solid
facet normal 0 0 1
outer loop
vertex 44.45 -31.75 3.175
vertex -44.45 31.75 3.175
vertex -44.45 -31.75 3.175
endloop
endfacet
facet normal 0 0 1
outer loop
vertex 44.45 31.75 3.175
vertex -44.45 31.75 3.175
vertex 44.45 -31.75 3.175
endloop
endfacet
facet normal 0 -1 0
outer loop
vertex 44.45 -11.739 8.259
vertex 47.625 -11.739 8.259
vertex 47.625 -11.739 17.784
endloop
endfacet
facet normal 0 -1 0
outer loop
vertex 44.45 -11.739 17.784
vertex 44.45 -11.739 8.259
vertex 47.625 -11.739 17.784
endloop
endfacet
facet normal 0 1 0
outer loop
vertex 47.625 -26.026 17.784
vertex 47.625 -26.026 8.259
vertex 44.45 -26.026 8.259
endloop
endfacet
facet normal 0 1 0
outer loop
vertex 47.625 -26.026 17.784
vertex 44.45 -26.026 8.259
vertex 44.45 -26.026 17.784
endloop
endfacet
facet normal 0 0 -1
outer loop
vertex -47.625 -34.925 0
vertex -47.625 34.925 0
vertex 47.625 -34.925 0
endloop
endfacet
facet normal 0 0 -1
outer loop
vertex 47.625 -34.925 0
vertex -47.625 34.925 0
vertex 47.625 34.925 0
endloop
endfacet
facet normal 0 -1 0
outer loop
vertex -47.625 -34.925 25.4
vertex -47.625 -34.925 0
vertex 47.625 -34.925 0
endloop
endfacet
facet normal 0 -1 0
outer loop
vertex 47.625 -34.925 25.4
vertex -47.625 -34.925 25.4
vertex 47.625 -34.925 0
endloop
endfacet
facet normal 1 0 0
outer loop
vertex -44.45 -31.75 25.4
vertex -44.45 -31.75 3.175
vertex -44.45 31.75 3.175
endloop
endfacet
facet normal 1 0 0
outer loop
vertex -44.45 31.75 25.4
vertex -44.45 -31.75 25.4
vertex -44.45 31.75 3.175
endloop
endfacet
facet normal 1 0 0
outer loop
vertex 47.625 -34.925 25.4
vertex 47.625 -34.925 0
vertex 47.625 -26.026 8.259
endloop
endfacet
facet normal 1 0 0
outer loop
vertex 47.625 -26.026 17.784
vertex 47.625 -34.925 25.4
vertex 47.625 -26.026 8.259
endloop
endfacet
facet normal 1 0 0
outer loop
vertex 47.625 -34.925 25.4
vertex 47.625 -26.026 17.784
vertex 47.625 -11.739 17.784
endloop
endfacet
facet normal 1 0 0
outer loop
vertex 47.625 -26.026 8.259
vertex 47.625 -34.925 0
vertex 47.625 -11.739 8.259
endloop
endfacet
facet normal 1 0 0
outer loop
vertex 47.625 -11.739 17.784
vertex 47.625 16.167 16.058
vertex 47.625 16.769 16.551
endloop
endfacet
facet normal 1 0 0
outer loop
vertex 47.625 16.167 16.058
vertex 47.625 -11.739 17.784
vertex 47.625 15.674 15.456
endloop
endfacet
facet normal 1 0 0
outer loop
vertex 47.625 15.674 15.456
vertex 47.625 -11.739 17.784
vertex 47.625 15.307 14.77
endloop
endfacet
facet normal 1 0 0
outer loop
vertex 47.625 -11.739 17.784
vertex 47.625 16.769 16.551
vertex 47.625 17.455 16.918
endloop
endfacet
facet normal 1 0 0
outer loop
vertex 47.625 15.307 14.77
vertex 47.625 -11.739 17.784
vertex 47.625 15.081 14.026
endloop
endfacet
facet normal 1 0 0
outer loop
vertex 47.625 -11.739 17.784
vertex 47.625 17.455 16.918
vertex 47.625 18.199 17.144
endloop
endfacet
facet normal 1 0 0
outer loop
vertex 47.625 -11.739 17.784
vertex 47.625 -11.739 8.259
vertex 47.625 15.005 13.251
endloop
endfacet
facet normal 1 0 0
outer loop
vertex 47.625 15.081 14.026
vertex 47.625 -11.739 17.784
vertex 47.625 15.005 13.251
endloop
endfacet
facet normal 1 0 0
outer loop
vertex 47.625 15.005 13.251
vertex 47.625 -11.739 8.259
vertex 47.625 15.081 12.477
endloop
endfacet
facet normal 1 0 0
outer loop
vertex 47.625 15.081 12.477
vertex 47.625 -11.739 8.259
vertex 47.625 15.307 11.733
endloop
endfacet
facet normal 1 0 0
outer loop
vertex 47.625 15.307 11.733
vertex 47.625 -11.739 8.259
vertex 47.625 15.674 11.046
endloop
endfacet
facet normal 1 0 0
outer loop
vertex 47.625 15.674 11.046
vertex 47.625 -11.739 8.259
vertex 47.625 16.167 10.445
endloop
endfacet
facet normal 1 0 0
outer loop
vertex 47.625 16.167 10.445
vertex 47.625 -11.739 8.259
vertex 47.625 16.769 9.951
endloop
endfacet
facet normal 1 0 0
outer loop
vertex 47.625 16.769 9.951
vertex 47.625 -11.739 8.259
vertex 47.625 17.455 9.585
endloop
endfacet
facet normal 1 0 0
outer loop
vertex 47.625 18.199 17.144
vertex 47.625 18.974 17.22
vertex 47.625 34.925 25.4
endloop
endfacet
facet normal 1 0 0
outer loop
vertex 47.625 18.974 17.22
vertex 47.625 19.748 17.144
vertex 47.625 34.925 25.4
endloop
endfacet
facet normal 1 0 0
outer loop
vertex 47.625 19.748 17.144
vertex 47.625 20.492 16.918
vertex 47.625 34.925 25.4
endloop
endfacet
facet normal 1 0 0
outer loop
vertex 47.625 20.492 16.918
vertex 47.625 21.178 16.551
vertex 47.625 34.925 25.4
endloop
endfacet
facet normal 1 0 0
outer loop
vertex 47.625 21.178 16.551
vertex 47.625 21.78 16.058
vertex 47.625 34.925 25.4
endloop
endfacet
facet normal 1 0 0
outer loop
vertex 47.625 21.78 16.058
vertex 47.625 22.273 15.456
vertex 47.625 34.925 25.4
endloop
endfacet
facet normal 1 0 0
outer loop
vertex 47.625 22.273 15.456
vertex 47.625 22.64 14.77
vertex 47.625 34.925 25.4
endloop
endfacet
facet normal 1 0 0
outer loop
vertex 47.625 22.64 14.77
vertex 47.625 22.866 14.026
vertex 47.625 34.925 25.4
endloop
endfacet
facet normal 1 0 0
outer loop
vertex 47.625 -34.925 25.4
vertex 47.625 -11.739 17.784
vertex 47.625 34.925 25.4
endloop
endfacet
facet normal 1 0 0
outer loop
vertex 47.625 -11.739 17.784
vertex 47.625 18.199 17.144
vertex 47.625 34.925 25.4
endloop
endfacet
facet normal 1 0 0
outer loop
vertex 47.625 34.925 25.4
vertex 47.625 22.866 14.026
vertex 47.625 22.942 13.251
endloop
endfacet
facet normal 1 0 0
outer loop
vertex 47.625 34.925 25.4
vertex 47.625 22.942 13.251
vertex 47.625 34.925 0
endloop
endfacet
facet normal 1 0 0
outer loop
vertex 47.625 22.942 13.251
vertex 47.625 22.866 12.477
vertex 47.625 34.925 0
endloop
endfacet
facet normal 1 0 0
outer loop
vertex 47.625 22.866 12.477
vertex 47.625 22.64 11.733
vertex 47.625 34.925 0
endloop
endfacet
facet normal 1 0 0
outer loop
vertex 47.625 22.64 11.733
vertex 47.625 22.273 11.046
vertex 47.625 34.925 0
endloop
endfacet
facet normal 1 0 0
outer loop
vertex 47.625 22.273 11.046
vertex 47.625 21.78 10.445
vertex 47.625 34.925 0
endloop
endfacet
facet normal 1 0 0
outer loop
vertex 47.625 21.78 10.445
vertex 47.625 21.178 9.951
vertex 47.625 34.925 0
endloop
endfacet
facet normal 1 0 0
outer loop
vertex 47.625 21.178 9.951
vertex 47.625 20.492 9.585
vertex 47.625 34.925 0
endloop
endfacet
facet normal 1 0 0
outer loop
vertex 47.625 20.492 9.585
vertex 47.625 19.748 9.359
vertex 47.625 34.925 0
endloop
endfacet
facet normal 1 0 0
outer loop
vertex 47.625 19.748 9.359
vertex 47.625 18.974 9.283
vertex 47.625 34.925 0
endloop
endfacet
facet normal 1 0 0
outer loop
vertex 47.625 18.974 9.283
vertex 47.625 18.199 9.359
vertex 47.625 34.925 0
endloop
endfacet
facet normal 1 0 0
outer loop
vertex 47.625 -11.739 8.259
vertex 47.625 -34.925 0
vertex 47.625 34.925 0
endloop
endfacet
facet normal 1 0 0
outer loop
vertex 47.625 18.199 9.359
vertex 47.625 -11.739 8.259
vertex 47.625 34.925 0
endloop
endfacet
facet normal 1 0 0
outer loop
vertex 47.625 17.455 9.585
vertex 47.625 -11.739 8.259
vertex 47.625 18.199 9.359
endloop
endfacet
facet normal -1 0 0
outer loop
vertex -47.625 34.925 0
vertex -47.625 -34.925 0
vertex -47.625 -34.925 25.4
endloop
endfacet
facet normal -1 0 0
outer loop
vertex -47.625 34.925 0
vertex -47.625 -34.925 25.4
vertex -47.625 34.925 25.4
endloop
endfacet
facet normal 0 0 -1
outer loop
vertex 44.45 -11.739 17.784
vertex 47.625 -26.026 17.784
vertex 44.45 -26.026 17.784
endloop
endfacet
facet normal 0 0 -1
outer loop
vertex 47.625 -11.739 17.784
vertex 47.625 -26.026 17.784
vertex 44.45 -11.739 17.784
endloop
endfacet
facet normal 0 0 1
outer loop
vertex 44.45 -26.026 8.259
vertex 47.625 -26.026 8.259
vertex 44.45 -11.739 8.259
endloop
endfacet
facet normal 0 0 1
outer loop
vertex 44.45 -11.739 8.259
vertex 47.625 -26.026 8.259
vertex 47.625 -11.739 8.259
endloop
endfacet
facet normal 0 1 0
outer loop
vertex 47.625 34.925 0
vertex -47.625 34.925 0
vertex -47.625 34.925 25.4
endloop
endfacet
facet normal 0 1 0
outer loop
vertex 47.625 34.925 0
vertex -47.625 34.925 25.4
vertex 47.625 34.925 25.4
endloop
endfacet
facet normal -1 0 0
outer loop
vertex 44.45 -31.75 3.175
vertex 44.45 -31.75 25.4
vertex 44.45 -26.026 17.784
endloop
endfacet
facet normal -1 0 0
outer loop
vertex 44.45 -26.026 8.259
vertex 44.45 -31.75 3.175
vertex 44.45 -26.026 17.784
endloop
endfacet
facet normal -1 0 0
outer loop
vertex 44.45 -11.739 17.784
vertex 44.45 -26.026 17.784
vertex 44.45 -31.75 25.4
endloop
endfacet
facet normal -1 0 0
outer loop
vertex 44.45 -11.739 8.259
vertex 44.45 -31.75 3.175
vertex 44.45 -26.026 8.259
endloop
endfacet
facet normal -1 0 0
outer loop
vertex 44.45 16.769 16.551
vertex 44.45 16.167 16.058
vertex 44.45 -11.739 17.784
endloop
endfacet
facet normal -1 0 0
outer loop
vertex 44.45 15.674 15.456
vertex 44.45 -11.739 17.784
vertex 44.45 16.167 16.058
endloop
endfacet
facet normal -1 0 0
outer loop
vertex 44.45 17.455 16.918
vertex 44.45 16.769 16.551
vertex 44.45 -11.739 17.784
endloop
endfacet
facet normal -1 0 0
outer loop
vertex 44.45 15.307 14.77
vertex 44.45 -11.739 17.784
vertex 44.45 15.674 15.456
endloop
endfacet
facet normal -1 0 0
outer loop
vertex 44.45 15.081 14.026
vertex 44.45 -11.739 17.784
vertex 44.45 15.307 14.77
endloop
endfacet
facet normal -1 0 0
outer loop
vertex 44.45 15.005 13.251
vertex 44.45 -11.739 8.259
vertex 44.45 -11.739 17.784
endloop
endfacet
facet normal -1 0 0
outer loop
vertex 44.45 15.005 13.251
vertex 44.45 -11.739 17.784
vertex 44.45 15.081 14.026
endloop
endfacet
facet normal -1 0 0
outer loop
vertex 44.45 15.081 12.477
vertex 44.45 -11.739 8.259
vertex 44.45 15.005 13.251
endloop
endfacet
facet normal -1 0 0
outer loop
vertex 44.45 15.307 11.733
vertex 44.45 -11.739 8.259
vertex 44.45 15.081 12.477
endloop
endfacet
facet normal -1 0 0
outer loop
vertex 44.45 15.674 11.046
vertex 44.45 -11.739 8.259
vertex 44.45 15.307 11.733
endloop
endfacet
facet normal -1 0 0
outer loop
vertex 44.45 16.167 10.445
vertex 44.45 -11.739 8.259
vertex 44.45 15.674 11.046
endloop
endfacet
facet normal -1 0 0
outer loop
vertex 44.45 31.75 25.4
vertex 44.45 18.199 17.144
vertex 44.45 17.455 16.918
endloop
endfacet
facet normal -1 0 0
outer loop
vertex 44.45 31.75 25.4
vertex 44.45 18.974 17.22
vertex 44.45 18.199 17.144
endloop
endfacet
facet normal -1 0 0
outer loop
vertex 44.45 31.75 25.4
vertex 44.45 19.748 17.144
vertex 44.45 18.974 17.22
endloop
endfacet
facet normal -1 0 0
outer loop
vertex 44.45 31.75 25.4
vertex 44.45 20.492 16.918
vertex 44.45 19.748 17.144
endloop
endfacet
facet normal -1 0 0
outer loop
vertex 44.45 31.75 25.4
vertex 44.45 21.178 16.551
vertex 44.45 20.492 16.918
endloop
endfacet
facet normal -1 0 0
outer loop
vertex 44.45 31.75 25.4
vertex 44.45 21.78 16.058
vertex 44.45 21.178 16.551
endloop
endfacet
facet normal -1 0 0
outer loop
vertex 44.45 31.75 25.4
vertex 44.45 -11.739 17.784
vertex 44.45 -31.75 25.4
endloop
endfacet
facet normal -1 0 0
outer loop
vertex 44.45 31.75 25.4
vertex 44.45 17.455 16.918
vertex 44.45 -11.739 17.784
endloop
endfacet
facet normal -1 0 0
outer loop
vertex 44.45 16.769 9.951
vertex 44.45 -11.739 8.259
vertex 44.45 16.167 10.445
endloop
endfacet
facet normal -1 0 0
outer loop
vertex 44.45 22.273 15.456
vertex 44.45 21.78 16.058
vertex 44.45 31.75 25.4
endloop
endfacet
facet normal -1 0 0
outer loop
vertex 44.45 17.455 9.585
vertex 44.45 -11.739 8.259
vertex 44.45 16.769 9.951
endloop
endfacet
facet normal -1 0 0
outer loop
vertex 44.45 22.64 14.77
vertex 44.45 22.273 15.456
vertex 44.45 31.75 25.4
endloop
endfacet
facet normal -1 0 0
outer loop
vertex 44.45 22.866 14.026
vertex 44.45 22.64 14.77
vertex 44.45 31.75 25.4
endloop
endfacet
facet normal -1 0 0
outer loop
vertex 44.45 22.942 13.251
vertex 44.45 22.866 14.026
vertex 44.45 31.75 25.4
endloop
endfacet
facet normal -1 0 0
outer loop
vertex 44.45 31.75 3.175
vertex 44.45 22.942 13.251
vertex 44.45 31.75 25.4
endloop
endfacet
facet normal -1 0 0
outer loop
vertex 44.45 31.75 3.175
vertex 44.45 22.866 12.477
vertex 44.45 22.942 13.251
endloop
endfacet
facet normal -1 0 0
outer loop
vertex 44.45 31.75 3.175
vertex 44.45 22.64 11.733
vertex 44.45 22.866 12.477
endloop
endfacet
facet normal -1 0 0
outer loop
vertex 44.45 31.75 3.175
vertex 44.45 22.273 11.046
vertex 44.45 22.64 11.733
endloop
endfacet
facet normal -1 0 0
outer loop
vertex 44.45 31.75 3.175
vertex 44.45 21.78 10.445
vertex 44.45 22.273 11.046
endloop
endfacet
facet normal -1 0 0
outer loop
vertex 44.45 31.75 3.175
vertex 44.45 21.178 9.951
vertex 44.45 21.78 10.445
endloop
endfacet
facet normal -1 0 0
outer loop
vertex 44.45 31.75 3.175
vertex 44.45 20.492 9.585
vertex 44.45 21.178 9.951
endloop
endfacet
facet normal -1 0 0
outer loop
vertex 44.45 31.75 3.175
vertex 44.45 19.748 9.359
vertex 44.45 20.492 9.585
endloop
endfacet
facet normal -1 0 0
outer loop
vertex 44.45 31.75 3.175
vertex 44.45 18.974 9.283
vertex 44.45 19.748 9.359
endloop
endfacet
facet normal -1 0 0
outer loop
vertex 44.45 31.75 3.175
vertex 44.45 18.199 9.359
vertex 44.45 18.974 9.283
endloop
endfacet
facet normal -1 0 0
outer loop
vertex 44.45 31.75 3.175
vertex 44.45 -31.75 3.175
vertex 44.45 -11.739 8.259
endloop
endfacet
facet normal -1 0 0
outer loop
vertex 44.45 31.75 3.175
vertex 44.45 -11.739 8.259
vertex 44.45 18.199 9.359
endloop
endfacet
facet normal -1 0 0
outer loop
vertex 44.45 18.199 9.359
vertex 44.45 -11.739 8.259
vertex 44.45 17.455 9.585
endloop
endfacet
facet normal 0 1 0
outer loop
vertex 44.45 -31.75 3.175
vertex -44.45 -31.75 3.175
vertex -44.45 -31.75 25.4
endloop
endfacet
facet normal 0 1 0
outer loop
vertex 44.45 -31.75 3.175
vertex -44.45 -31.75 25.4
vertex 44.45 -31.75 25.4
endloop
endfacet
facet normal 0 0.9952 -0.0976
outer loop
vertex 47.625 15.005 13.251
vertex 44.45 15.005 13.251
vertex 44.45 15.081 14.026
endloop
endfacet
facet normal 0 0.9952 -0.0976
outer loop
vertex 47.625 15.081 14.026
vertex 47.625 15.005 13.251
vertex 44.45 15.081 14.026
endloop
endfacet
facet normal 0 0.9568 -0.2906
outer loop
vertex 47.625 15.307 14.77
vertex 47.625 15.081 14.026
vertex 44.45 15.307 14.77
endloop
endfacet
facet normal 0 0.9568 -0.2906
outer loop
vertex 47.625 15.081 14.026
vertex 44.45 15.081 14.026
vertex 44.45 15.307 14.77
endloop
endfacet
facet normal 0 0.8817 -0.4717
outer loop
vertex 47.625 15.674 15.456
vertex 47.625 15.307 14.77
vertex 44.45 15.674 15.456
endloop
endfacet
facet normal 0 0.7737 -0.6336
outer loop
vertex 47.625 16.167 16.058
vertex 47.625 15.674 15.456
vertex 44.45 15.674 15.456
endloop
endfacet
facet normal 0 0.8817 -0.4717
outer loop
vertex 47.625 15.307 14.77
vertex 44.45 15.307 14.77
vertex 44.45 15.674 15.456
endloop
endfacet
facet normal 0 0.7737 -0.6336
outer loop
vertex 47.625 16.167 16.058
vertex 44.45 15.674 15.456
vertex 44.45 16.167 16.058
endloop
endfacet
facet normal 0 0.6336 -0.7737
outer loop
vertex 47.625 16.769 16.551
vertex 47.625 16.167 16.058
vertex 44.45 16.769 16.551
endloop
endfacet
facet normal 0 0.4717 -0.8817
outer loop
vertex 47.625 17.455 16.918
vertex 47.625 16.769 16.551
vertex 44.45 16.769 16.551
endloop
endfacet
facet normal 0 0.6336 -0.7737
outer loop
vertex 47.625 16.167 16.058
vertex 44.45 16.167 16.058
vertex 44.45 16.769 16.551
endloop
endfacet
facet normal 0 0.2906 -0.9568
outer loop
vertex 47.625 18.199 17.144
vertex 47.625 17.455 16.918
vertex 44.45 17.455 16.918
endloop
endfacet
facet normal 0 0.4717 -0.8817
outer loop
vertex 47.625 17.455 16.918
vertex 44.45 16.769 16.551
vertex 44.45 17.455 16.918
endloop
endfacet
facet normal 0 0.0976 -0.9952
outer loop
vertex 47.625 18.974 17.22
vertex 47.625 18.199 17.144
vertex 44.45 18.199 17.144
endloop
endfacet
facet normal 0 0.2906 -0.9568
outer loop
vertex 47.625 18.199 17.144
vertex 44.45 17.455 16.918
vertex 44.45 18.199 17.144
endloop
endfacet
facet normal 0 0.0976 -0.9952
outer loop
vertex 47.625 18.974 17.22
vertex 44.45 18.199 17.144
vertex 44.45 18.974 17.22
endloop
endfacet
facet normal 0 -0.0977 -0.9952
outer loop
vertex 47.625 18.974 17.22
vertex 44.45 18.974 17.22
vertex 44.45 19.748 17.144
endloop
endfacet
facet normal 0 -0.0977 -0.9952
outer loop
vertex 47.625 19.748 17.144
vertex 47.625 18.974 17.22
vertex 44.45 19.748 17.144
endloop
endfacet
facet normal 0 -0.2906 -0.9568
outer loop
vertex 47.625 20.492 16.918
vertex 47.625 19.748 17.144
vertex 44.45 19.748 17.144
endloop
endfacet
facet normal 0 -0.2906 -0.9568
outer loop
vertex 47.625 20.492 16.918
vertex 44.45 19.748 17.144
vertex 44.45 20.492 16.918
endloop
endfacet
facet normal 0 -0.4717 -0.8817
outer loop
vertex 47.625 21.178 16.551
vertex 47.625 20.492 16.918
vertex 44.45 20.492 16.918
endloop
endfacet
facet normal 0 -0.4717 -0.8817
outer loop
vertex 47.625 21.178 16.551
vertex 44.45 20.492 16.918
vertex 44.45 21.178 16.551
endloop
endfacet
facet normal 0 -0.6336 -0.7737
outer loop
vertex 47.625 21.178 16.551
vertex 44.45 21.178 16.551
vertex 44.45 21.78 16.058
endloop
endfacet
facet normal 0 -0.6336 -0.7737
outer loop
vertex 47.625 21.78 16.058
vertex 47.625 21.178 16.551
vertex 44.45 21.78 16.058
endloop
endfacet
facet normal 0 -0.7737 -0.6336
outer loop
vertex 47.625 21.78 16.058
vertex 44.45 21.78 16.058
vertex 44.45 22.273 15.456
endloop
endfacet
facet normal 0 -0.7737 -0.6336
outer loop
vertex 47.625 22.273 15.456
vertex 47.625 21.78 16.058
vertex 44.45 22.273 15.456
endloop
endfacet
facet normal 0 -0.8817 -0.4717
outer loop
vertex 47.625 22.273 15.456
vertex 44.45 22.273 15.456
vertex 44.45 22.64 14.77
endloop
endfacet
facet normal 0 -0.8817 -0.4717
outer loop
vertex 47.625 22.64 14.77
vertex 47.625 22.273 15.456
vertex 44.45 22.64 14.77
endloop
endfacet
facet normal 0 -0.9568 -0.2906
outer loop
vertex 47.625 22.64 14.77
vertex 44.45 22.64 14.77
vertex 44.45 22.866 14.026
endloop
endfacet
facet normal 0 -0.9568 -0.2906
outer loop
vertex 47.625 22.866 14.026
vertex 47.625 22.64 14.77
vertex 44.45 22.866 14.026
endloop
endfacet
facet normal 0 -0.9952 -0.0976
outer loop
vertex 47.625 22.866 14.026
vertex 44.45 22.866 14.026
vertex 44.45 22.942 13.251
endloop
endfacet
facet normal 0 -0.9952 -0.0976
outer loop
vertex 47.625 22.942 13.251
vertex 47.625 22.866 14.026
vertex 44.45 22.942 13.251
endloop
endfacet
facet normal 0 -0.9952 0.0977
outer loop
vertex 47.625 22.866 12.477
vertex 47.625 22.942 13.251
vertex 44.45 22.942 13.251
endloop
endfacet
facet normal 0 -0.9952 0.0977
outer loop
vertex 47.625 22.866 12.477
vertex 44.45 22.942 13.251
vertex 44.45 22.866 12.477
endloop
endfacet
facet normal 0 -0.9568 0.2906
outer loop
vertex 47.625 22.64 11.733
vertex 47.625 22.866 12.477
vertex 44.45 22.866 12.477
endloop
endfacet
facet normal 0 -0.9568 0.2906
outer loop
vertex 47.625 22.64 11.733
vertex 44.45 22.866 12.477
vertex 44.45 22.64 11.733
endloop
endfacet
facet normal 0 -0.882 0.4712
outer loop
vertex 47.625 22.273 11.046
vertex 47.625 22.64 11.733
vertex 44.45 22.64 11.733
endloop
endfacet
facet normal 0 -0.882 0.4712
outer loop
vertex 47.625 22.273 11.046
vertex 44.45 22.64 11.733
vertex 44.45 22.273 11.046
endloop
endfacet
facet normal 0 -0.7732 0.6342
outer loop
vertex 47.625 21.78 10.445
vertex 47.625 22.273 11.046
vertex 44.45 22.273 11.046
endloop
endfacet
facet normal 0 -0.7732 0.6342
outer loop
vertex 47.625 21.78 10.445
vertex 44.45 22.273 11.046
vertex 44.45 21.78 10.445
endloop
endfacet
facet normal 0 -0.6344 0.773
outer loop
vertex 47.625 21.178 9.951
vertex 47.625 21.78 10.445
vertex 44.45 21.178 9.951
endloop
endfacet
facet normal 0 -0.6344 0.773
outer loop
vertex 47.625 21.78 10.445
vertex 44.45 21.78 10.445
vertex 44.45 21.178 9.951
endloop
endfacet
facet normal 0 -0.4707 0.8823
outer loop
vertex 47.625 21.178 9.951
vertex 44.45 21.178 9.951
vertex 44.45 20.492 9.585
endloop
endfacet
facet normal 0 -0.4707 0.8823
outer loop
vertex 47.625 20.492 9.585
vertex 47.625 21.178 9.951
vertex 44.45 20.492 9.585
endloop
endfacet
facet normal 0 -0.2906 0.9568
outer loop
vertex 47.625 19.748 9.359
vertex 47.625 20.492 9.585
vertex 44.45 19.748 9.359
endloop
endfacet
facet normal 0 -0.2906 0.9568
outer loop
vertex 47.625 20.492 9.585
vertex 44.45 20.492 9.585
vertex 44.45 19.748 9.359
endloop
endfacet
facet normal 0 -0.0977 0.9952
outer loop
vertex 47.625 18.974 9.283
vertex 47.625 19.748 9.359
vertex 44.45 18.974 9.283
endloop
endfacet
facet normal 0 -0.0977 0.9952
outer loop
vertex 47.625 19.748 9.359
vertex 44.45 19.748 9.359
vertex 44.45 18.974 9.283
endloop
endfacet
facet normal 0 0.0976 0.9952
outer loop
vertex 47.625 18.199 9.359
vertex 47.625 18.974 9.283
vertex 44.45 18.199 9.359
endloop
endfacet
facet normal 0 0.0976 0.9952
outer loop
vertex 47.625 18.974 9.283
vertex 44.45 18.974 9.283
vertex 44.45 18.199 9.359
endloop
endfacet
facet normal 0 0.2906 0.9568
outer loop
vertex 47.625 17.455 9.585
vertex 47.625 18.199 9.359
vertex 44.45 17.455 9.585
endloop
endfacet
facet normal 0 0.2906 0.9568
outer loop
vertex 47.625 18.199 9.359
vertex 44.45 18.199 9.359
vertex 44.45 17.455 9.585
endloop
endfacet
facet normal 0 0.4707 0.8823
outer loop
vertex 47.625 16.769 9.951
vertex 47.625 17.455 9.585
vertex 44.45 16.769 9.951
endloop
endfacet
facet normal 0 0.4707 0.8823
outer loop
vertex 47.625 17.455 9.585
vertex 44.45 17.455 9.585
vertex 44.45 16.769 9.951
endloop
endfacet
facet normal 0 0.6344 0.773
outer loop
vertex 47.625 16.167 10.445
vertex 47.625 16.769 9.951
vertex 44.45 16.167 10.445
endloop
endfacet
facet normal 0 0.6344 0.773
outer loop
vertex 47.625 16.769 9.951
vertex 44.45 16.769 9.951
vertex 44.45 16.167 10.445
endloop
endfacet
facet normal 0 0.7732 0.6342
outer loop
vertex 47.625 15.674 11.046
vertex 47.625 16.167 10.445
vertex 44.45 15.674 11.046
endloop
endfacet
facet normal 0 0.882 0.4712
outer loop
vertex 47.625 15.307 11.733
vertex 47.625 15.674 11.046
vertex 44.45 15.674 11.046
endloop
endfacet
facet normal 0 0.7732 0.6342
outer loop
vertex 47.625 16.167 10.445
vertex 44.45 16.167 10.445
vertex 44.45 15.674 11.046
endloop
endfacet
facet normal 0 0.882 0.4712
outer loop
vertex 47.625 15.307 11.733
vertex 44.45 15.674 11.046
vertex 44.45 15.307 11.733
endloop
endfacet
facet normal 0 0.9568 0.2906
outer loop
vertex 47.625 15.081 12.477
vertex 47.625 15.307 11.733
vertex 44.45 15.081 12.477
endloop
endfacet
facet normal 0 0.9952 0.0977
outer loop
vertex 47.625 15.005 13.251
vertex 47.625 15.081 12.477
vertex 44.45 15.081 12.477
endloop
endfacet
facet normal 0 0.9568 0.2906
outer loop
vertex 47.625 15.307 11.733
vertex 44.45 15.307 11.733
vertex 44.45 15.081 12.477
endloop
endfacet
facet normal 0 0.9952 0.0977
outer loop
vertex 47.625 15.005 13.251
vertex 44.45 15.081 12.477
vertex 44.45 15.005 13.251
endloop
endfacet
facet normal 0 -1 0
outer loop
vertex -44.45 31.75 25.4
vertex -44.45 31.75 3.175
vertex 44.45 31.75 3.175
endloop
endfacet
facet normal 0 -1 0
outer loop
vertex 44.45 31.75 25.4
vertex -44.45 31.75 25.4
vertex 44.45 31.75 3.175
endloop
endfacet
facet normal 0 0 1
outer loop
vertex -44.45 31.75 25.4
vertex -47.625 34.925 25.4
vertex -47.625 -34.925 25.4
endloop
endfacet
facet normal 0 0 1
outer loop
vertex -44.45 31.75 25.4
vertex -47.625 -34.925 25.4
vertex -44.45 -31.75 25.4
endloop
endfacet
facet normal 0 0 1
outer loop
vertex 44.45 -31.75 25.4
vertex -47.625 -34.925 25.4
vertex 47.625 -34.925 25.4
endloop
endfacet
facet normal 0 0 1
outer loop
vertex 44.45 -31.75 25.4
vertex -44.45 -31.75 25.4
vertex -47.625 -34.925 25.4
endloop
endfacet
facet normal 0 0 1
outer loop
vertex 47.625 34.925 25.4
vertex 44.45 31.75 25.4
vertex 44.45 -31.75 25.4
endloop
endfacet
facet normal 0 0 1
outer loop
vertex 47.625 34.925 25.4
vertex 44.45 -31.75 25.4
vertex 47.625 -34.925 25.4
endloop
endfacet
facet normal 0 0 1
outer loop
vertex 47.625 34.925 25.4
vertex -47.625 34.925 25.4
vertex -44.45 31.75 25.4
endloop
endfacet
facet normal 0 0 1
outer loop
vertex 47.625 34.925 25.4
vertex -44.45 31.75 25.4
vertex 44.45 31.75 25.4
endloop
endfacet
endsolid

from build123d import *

# Parameters (mm, degrees)
F0_W     = 95.25
F0_H     = 69.85
F0_W_2   = 88.9
F0_H_2   = 63.5
F1_DEPTH = 25.4
F3_DEPTH = 3.175
F5_D     = 7.9375
F5_DEPTH = 12.7
F2_W     = 14.2875
F2_H     = 9.525
F6_DEPTH = 12.7


with BuildPart() as f1:
    # F0 (on Top) → F1 (new body)
    with BuildSketch(Plane.XY):
        Rectangle(F0_W, F0_H)
        Rectangle(F0_W_2, F0_H_2, mode=Mode.SUBTRACT)
    extrude(amount=F1_DEPTH)

    # F0 (on Top) → F3 (join)
    with BuildSketch(Plane.XY):
        Rectangle(F0_W_2, F0_H_2)
    extrude(amount=F3_DEPTH)

    # F5
    with Locations(Plane.YZ.offset(47.625)):
        with Locations((18.973511, 13.251342)):
            Hole(F5_D / 2, depth=F5_DEPTH)

    # F2 (on face) → F6 (cut, symmetric)
    with BuildSketch(Plane.YZ.offset(47.625)):
        with Locations((-18.882488, 13.021725)):
            Rectangle(F2_W, F2_H)
    extrude(amount=F6_DEPTH, both=True, mode=Mode.SUBTRACT)


solid = f1.part
